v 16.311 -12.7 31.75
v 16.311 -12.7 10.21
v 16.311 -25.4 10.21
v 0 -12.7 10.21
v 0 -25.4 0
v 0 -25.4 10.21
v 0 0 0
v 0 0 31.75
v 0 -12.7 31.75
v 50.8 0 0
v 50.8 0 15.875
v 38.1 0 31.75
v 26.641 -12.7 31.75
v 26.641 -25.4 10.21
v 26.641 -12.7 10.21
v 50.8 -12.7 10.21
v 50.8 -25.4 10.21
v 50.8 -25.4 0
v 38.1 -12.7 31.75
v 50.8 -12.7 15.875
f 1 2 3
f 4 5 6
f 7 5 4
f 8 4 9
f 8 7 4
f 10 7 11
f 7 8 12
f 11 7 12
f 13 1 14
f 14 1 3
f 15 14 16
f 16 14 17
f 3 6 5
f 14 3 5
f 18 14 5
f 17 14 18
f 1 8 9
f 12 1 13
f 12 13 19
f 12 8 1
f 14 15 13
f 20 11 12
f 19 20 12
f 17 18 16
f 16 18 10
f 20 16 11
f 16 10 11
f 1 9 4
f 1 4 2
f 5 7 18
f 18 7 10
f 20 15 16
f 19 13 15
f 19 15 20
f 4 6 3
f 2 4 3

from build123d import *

# Parameters (mm, degrees)
F0_W     = 50.8
F0_H     = 31.75
F1_DEPTH = 25.4
F3_DEPTH = 12.7
F4_W     = 50.8
F4_H     = 21.5396340117
F5_DEPTH = 12.7
F6_W     = 10.3306490928
F6_H     = 21.5396340117
F7_DEPTH = 25.4
F9_DEPTH = 25.4


with BuildPart() as f1:
    # F0 (on Front) → F1 (new body)
    with BuildSketch(Plane.XZ):
        with Locations((25.4, 15.875)):
            Rectangle(F0_W, F0_H)
    extrude(amount=F1_DEPTH)

    # F2 (on face) → F3 (cut)
    with BuildSketch(Plane(origin=(0, 0, 0), x_dir=(-1, 0, 0), z_dir=(0, 1, 0))):
        Polygon((-50.8, 31.75), (-50.8, 15.875), (-38.1, 31.75), align=None)
    extrude(amount=-F3_DEPTH, mode=Mode.SUBTRACT)

    # F4 (on face) → F5 (cut)
    with BuildSketch(Plane.XZ.offset(25.4)):
        with Locations((25.4, 20.9801829942)):
            Rectangle(F4_W, F4_H)
    extrude(amount=-F5_DEPTH, mode=Mode.SUBTRACT)

    # F6 (on face) → F7 (join)
    with BuildSketch(Plane.XZ.offset(12.7)):
        with Locations((21.4760145172, 20.9801829942)):
            Rectangle(F6_W, F6_H)
    extrude(amount=F7_DEPTH)

    # F8 (on face) → F9 (cut)
    with BuildSketch(Plane(origin=(16.3106899709, 0, 0), x_dir=(0, -1, 0), z_dir=(-1, 0, 0))):
        Polygon((38.1, 31.75), (12.7, 31.75), (25.4, 10.2103659883), (38.1, 10.2103659883), align=None)
    extrude(amount=-F9_DEPTH, mode=Mode.SUBTRACT)


solid = f1.part
